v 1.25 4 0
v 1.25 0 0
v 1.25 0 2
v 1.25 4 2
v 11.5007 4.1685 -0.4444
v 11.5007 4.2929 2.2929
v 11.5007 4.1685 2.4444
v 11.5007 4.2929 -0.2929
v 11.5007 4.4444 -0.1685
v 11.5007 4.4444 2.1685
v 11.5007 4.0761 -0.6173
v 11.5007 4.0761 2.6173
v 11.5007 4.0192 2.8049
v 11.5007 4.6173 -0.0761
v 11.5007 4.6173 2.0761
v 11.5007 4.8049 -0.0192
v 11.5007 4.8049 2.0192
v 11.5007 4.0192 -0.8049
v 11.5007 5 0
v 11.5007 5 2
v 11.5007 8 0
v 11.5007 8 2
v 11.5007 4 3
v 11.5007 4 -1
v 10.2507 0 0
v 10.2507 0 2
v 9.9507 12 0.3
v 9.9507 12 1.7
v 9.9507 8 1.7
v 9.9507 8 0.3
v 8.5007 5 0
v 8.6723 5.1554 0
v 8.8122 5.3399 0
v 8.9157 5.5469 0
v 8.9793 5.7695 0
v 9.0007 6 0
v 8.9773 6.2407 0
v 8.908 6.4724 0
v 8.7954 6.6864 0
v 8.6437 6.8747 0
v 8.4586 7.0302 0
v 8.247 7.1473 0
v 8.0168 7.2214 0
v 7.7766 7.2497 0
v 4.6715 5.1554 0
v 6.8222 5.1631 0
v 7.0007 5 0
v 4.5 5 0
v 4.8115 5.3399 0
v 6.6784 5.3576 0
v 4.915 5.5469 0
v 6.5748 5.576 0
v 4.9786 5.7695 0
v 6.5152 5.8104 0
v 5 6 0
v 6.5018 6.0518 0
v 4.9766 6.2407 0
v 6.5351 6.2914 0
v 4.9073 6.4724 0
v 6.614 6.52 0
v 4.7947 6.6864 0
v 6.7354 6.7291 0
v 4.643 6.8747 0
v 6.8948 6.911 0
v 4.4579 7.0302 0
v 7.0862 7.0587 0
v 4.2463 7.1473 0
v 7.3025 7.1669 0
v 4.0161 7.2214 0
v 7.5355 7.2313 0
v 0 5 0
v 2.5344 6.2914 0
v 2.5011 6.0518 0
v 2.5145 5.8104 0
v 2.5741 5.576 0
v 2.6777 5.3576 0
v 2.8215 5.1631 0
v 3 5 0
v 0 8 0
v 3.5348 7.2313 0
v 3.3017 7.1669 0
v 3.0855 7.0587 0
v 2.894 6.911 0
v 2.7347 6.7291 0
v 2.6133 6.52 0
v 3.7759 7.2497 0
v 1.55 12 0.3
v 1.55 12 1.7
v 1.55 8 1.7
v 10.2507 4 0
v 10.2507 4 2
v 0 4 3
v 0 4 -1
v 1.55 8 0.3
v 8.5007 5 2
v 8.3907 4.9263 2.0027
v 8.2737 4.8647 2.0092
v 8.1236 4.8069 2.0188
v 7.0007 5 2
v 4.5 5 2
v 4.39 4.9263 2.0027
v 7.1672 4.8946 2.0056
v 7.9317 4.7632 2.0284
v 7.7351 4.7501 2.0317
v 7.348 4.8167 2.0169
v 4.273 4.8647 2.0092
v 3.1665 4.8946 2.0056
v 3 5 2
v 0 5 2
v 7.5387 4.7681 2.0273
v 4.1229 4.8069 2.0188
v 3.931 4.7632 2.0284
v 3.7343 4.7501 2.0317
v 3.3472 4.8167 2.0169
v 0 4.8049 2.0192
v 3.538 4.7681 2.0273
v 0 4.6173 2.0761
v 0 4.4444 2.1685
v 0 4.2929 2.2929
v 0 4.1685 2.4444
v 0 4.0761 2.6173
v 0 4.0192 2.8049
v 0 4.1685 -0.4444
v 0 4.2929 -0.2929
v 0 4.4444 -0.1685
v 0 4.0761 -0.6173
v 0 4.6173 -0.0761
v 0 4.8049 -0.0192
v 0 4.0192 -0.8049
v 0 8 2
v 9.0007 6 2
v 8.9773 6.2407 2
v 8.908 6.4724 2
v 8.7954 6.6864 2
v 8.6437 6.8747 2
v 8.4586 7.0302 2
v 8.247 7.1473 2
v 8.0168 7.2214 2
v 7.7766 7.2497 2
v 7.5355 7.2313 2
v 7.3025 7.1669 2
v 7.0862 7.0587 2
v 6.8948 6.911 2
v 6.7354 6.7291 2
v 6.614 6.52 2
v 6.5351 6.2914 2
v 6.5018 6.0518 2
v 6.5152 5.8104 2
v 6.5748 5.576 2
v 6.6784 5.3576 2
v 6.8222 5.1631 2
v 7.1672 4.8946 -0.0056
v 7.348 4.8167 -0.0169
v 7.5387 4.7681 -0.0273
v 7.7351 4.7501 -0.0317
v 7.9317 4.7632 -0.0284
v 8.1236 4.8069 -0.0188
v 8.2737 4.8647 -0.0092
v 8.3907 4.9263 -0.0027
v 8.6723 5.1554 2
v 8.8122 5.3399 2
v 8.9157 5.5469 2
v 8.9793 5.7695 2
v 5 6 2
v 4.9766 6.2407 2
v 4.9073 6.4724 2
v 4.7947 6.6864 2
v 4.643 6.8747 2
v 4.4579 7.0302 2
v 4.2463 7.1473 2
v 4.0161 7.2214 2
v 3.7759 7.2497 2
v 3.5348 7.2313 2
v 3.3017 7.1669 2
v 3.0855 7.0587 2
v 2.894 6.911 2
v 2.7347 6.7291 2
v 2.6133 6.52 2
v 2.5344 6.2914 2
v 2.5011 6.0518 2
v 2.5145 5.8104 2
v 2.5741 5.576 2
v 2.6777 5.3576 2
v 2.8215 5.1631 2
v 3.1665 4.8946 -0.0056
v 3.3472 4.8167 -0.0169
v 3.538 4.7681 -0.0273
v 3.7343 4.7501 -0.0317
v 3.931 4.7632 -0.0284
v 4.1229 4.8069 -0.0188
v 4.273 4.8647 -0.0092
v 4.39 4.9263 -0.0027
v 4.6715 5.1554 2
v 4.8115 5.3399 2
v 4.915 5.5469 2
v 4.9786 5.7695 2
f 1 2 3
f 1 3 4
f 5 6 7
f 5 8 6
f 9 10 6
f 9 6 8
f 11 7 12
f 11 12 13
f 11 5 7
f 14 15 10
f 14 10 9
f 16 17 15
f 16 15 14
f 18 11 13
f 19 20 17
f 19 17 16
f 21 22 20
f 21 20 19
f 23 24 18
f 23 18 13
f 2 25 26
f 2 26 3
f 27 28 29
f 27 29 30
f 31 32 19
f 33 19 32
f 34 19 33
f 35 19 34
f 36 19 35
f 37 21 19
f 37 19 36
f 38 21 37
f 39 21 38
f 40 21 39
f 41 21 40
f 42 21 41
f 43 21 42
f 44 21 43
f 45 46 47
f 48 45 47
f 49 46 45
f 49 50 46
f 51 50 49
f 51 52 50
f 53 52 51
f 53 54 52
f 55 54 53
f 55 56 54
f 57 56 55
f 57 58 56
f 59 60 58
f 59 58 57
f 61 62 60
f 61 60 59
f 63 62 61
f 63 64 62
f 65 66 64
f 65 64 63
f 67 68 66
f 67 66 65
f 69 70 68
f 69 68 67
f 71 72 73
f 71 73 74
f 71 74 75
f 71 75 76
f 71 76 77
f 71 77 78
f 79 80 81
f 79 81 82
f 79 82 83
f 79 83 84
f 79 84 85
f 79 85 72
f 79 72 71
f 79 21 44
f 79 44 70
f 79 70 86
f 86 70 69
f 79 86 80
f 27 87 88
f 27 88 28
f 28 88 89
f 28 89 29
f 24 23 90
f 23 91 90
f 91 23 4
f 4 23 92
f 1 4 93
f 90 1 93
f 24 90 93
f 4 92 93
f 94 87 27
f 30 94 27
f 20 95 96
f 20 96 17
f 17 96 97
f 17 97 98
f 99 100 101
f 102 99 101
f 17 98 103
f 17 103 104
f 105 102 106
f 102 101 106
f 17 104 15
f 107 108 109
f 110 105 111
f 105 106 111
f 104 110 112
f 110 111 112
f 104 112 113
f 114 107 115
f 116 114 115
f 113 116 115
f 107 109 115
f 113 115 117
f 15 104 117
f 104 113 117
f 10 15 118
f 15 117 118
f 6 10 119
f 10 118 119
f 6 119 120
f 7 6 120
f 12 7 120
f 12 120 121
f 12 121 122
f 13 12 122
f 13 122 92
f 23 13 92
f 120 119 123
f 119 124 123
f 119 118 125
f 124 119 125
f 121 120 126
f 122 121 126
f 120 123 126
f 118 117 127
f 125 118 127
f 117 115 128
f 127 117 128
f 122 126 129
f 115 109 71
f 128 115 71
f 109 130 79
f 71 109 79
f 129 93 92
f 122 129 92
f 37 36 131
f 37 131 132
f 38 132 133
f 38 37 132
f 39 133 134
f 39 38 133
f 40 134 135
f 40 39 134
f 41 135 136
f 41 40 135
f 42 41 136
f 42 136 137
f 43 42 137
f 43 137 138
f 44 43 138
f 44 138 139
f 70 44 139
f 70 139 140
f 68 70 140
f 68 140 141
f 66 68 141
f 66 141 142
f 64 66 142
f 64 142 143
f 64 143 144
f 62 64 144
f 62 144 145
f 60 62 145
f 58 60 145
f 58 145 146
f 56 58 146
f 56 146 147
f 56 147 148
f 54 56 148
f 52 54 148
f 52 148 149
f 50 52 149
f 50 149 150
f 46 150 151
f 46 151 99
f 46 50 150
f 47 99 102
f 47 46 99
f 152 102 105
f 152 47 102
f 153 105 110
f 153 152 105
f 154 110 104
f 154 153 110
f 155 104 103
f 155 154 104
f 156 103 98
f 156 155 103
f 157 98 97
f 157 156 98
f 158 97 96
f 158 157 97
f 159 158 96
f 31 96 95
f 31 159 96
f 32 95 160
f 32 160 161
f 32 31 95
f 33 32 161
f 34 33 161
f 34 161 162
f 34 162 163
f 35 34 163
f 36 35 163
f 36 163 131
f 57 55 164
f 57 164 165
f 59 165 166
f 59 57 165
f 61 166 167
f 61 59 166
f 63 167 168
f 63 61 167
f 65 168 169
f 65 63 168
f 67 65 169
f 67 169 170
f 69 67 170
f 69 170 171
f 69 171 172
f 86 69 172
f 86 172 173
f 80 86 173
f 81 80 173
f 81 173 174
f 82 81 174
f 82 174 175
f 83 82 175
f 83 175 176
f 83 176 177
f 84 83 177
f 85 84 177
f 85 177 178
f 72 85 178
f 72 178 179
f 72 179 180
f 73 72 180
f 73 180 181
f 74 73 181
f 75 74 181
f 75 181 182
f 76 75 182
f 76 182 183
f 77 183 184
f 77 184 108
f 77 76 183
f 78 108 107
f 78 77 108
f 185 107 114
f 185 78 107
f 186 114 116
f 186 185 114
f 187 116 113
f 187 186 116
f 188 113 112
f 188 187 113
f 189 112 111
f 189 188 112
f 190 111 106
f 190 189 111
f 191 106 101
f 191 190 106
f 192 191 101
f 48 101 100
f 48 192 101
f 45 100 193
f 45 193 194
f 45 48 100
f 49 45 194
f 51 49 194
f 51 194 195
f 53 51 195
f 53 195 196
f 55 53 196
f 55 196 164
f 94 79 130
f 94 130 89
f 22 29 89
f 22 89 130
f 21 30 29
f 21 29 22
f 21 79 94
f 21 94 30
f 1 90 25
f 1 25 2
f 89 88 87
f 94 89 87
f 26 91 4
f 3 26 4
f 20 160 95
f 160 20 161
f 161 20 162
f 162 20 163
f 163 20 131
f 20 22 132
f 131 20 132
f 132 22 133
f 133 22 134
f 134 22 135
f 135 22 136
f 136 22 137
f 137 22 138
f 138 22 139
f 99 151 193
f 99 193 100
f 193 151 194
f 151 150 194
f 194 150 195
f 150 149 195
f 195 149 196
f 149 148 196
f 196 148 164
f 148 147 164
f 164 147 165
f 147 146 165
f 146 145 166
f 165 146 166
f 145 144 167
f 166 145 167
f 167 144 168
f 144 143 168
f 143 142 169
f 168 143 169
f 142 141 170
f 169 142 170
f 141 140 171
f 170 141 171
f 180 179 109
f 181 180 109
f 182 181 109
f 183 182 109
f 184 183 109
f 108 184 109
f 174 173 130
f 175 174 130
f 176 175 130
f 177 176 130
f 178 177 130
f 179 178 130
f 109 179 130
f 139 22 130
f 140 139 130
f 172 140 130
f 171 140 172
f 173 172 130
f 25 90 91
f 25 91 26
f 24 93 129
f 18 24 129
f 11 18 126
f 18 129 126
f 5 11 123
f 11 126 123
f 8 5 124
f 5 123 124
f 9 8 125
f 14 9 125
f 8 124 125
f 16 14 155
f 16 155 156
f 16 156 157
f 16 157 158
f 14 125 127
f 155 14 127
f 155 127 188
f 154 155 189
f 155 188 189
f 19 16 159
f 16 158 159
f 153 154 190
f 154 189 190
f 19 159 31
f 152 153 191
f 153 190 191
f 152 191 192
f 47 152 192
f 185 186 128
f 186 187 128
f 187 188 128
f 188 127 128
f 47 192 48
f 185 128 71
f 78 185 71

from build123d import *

# Parameters (mm, degrees)
MODEL_R                 = 1.25
BOSS_EXTRUDE1_DEPTH     = 2
BOSS_EXTRUDE2_DEPTH     = 11.50072
SKETCH2_R               = 1.25
CUT_EXTRUDE1_DEPTH      = 2
CUT_EXTRUDE1_DEPTH_BACK = 4
SKETCH3_W               = 9.00072
SKETCH3_H               = 2
SKETCH3_W_2             = 8.40072
SKETCH3_H_2             = 1.4
CUT_EXTRUDE2_DEPTH      = 4


with BuildPart() as part:
    # Model → Boss-Extrude1 (new body)
    with BuildSketch(Plane.XY):
        Polygon((1.25, 4), (0, 4), (0, 8), (1.25, 8), (1.25, 12), (10.25072, 12), (10.25072, 8), (11.50072, 8), (11.50072, 4), (10.25072, 4), (10.25072, 0), (1.25, 0), align=None)
        with Locations((7.75072, 6)):
            Circle(MODEL_R, mode=Mode.SUBTRACT)
        with Locations((3.75, 6)):
            Circle(MODEL_R, mode=Mode.SUBTRACT)
    extrude(amount=BOSS_EXTRUDE1_DEPTH)

    # Sketch1 → Boss-Extrude2 (add)
    with BuildSketch(Plane.ZY):
        with BuildLine():
            Line((2, 4), (2, 5))
            ThreePointArc((2, 5), (2.292893219, 4.292893219), (3, 4))
            Line((3, 4), (2, 4))
        make_face()
        with BuildLine():
            Line((0, 4), (-1, 4))
            ThreePointArc((-1, 4), (-0.292893219, 4.292893219), (0, 5))
            Line((0, 5), (0, 4))
        make_face()
    extrude(amount=-BOSS_EXTRUDE2_DEPTH)

    # Sketch2 → Cut-Extrude1 (cut, two sides)
    with BuildSketch(Plane.XY.offset(2)) as cut_extrude1_sk:
        with Locations((3.75, 6)):
            Circle(SKETCH2_R)
        with Locations((7.75072, 6)):
            Circle(SKETCH2_R)
    extrude(amount=CUT_EXTRUDE1_DEPTH, mode=Mode.SUBTRACT)
    extrude(cut_extrude1_sk.sketch, amount=-CUT_EXTRUDE1_DEPTH_BACK, mode=Mode.SUBTRACT)

    # Sketch3 → Cut-Extrude2 (cut)
    with BuildSketch(Plane(origin=(0, 12, 0), x_dir=(1, 0, 0), z_dir=(0, 1, 0))):
        with Locations((5.75036, -1)):
            Rectangle(SKETCH3_W, SKETCH3_H)
        with Locations((5.75036, -1)):
            Rectangle(SKETCH3_W_2, SKETCH3_H_2, mode=Mode.SUBTRACT)
    extrude(amount=-CUT_EXTRUDE2_DEPTH, mode=Mode.SUBTRACT)


solid = part.part
